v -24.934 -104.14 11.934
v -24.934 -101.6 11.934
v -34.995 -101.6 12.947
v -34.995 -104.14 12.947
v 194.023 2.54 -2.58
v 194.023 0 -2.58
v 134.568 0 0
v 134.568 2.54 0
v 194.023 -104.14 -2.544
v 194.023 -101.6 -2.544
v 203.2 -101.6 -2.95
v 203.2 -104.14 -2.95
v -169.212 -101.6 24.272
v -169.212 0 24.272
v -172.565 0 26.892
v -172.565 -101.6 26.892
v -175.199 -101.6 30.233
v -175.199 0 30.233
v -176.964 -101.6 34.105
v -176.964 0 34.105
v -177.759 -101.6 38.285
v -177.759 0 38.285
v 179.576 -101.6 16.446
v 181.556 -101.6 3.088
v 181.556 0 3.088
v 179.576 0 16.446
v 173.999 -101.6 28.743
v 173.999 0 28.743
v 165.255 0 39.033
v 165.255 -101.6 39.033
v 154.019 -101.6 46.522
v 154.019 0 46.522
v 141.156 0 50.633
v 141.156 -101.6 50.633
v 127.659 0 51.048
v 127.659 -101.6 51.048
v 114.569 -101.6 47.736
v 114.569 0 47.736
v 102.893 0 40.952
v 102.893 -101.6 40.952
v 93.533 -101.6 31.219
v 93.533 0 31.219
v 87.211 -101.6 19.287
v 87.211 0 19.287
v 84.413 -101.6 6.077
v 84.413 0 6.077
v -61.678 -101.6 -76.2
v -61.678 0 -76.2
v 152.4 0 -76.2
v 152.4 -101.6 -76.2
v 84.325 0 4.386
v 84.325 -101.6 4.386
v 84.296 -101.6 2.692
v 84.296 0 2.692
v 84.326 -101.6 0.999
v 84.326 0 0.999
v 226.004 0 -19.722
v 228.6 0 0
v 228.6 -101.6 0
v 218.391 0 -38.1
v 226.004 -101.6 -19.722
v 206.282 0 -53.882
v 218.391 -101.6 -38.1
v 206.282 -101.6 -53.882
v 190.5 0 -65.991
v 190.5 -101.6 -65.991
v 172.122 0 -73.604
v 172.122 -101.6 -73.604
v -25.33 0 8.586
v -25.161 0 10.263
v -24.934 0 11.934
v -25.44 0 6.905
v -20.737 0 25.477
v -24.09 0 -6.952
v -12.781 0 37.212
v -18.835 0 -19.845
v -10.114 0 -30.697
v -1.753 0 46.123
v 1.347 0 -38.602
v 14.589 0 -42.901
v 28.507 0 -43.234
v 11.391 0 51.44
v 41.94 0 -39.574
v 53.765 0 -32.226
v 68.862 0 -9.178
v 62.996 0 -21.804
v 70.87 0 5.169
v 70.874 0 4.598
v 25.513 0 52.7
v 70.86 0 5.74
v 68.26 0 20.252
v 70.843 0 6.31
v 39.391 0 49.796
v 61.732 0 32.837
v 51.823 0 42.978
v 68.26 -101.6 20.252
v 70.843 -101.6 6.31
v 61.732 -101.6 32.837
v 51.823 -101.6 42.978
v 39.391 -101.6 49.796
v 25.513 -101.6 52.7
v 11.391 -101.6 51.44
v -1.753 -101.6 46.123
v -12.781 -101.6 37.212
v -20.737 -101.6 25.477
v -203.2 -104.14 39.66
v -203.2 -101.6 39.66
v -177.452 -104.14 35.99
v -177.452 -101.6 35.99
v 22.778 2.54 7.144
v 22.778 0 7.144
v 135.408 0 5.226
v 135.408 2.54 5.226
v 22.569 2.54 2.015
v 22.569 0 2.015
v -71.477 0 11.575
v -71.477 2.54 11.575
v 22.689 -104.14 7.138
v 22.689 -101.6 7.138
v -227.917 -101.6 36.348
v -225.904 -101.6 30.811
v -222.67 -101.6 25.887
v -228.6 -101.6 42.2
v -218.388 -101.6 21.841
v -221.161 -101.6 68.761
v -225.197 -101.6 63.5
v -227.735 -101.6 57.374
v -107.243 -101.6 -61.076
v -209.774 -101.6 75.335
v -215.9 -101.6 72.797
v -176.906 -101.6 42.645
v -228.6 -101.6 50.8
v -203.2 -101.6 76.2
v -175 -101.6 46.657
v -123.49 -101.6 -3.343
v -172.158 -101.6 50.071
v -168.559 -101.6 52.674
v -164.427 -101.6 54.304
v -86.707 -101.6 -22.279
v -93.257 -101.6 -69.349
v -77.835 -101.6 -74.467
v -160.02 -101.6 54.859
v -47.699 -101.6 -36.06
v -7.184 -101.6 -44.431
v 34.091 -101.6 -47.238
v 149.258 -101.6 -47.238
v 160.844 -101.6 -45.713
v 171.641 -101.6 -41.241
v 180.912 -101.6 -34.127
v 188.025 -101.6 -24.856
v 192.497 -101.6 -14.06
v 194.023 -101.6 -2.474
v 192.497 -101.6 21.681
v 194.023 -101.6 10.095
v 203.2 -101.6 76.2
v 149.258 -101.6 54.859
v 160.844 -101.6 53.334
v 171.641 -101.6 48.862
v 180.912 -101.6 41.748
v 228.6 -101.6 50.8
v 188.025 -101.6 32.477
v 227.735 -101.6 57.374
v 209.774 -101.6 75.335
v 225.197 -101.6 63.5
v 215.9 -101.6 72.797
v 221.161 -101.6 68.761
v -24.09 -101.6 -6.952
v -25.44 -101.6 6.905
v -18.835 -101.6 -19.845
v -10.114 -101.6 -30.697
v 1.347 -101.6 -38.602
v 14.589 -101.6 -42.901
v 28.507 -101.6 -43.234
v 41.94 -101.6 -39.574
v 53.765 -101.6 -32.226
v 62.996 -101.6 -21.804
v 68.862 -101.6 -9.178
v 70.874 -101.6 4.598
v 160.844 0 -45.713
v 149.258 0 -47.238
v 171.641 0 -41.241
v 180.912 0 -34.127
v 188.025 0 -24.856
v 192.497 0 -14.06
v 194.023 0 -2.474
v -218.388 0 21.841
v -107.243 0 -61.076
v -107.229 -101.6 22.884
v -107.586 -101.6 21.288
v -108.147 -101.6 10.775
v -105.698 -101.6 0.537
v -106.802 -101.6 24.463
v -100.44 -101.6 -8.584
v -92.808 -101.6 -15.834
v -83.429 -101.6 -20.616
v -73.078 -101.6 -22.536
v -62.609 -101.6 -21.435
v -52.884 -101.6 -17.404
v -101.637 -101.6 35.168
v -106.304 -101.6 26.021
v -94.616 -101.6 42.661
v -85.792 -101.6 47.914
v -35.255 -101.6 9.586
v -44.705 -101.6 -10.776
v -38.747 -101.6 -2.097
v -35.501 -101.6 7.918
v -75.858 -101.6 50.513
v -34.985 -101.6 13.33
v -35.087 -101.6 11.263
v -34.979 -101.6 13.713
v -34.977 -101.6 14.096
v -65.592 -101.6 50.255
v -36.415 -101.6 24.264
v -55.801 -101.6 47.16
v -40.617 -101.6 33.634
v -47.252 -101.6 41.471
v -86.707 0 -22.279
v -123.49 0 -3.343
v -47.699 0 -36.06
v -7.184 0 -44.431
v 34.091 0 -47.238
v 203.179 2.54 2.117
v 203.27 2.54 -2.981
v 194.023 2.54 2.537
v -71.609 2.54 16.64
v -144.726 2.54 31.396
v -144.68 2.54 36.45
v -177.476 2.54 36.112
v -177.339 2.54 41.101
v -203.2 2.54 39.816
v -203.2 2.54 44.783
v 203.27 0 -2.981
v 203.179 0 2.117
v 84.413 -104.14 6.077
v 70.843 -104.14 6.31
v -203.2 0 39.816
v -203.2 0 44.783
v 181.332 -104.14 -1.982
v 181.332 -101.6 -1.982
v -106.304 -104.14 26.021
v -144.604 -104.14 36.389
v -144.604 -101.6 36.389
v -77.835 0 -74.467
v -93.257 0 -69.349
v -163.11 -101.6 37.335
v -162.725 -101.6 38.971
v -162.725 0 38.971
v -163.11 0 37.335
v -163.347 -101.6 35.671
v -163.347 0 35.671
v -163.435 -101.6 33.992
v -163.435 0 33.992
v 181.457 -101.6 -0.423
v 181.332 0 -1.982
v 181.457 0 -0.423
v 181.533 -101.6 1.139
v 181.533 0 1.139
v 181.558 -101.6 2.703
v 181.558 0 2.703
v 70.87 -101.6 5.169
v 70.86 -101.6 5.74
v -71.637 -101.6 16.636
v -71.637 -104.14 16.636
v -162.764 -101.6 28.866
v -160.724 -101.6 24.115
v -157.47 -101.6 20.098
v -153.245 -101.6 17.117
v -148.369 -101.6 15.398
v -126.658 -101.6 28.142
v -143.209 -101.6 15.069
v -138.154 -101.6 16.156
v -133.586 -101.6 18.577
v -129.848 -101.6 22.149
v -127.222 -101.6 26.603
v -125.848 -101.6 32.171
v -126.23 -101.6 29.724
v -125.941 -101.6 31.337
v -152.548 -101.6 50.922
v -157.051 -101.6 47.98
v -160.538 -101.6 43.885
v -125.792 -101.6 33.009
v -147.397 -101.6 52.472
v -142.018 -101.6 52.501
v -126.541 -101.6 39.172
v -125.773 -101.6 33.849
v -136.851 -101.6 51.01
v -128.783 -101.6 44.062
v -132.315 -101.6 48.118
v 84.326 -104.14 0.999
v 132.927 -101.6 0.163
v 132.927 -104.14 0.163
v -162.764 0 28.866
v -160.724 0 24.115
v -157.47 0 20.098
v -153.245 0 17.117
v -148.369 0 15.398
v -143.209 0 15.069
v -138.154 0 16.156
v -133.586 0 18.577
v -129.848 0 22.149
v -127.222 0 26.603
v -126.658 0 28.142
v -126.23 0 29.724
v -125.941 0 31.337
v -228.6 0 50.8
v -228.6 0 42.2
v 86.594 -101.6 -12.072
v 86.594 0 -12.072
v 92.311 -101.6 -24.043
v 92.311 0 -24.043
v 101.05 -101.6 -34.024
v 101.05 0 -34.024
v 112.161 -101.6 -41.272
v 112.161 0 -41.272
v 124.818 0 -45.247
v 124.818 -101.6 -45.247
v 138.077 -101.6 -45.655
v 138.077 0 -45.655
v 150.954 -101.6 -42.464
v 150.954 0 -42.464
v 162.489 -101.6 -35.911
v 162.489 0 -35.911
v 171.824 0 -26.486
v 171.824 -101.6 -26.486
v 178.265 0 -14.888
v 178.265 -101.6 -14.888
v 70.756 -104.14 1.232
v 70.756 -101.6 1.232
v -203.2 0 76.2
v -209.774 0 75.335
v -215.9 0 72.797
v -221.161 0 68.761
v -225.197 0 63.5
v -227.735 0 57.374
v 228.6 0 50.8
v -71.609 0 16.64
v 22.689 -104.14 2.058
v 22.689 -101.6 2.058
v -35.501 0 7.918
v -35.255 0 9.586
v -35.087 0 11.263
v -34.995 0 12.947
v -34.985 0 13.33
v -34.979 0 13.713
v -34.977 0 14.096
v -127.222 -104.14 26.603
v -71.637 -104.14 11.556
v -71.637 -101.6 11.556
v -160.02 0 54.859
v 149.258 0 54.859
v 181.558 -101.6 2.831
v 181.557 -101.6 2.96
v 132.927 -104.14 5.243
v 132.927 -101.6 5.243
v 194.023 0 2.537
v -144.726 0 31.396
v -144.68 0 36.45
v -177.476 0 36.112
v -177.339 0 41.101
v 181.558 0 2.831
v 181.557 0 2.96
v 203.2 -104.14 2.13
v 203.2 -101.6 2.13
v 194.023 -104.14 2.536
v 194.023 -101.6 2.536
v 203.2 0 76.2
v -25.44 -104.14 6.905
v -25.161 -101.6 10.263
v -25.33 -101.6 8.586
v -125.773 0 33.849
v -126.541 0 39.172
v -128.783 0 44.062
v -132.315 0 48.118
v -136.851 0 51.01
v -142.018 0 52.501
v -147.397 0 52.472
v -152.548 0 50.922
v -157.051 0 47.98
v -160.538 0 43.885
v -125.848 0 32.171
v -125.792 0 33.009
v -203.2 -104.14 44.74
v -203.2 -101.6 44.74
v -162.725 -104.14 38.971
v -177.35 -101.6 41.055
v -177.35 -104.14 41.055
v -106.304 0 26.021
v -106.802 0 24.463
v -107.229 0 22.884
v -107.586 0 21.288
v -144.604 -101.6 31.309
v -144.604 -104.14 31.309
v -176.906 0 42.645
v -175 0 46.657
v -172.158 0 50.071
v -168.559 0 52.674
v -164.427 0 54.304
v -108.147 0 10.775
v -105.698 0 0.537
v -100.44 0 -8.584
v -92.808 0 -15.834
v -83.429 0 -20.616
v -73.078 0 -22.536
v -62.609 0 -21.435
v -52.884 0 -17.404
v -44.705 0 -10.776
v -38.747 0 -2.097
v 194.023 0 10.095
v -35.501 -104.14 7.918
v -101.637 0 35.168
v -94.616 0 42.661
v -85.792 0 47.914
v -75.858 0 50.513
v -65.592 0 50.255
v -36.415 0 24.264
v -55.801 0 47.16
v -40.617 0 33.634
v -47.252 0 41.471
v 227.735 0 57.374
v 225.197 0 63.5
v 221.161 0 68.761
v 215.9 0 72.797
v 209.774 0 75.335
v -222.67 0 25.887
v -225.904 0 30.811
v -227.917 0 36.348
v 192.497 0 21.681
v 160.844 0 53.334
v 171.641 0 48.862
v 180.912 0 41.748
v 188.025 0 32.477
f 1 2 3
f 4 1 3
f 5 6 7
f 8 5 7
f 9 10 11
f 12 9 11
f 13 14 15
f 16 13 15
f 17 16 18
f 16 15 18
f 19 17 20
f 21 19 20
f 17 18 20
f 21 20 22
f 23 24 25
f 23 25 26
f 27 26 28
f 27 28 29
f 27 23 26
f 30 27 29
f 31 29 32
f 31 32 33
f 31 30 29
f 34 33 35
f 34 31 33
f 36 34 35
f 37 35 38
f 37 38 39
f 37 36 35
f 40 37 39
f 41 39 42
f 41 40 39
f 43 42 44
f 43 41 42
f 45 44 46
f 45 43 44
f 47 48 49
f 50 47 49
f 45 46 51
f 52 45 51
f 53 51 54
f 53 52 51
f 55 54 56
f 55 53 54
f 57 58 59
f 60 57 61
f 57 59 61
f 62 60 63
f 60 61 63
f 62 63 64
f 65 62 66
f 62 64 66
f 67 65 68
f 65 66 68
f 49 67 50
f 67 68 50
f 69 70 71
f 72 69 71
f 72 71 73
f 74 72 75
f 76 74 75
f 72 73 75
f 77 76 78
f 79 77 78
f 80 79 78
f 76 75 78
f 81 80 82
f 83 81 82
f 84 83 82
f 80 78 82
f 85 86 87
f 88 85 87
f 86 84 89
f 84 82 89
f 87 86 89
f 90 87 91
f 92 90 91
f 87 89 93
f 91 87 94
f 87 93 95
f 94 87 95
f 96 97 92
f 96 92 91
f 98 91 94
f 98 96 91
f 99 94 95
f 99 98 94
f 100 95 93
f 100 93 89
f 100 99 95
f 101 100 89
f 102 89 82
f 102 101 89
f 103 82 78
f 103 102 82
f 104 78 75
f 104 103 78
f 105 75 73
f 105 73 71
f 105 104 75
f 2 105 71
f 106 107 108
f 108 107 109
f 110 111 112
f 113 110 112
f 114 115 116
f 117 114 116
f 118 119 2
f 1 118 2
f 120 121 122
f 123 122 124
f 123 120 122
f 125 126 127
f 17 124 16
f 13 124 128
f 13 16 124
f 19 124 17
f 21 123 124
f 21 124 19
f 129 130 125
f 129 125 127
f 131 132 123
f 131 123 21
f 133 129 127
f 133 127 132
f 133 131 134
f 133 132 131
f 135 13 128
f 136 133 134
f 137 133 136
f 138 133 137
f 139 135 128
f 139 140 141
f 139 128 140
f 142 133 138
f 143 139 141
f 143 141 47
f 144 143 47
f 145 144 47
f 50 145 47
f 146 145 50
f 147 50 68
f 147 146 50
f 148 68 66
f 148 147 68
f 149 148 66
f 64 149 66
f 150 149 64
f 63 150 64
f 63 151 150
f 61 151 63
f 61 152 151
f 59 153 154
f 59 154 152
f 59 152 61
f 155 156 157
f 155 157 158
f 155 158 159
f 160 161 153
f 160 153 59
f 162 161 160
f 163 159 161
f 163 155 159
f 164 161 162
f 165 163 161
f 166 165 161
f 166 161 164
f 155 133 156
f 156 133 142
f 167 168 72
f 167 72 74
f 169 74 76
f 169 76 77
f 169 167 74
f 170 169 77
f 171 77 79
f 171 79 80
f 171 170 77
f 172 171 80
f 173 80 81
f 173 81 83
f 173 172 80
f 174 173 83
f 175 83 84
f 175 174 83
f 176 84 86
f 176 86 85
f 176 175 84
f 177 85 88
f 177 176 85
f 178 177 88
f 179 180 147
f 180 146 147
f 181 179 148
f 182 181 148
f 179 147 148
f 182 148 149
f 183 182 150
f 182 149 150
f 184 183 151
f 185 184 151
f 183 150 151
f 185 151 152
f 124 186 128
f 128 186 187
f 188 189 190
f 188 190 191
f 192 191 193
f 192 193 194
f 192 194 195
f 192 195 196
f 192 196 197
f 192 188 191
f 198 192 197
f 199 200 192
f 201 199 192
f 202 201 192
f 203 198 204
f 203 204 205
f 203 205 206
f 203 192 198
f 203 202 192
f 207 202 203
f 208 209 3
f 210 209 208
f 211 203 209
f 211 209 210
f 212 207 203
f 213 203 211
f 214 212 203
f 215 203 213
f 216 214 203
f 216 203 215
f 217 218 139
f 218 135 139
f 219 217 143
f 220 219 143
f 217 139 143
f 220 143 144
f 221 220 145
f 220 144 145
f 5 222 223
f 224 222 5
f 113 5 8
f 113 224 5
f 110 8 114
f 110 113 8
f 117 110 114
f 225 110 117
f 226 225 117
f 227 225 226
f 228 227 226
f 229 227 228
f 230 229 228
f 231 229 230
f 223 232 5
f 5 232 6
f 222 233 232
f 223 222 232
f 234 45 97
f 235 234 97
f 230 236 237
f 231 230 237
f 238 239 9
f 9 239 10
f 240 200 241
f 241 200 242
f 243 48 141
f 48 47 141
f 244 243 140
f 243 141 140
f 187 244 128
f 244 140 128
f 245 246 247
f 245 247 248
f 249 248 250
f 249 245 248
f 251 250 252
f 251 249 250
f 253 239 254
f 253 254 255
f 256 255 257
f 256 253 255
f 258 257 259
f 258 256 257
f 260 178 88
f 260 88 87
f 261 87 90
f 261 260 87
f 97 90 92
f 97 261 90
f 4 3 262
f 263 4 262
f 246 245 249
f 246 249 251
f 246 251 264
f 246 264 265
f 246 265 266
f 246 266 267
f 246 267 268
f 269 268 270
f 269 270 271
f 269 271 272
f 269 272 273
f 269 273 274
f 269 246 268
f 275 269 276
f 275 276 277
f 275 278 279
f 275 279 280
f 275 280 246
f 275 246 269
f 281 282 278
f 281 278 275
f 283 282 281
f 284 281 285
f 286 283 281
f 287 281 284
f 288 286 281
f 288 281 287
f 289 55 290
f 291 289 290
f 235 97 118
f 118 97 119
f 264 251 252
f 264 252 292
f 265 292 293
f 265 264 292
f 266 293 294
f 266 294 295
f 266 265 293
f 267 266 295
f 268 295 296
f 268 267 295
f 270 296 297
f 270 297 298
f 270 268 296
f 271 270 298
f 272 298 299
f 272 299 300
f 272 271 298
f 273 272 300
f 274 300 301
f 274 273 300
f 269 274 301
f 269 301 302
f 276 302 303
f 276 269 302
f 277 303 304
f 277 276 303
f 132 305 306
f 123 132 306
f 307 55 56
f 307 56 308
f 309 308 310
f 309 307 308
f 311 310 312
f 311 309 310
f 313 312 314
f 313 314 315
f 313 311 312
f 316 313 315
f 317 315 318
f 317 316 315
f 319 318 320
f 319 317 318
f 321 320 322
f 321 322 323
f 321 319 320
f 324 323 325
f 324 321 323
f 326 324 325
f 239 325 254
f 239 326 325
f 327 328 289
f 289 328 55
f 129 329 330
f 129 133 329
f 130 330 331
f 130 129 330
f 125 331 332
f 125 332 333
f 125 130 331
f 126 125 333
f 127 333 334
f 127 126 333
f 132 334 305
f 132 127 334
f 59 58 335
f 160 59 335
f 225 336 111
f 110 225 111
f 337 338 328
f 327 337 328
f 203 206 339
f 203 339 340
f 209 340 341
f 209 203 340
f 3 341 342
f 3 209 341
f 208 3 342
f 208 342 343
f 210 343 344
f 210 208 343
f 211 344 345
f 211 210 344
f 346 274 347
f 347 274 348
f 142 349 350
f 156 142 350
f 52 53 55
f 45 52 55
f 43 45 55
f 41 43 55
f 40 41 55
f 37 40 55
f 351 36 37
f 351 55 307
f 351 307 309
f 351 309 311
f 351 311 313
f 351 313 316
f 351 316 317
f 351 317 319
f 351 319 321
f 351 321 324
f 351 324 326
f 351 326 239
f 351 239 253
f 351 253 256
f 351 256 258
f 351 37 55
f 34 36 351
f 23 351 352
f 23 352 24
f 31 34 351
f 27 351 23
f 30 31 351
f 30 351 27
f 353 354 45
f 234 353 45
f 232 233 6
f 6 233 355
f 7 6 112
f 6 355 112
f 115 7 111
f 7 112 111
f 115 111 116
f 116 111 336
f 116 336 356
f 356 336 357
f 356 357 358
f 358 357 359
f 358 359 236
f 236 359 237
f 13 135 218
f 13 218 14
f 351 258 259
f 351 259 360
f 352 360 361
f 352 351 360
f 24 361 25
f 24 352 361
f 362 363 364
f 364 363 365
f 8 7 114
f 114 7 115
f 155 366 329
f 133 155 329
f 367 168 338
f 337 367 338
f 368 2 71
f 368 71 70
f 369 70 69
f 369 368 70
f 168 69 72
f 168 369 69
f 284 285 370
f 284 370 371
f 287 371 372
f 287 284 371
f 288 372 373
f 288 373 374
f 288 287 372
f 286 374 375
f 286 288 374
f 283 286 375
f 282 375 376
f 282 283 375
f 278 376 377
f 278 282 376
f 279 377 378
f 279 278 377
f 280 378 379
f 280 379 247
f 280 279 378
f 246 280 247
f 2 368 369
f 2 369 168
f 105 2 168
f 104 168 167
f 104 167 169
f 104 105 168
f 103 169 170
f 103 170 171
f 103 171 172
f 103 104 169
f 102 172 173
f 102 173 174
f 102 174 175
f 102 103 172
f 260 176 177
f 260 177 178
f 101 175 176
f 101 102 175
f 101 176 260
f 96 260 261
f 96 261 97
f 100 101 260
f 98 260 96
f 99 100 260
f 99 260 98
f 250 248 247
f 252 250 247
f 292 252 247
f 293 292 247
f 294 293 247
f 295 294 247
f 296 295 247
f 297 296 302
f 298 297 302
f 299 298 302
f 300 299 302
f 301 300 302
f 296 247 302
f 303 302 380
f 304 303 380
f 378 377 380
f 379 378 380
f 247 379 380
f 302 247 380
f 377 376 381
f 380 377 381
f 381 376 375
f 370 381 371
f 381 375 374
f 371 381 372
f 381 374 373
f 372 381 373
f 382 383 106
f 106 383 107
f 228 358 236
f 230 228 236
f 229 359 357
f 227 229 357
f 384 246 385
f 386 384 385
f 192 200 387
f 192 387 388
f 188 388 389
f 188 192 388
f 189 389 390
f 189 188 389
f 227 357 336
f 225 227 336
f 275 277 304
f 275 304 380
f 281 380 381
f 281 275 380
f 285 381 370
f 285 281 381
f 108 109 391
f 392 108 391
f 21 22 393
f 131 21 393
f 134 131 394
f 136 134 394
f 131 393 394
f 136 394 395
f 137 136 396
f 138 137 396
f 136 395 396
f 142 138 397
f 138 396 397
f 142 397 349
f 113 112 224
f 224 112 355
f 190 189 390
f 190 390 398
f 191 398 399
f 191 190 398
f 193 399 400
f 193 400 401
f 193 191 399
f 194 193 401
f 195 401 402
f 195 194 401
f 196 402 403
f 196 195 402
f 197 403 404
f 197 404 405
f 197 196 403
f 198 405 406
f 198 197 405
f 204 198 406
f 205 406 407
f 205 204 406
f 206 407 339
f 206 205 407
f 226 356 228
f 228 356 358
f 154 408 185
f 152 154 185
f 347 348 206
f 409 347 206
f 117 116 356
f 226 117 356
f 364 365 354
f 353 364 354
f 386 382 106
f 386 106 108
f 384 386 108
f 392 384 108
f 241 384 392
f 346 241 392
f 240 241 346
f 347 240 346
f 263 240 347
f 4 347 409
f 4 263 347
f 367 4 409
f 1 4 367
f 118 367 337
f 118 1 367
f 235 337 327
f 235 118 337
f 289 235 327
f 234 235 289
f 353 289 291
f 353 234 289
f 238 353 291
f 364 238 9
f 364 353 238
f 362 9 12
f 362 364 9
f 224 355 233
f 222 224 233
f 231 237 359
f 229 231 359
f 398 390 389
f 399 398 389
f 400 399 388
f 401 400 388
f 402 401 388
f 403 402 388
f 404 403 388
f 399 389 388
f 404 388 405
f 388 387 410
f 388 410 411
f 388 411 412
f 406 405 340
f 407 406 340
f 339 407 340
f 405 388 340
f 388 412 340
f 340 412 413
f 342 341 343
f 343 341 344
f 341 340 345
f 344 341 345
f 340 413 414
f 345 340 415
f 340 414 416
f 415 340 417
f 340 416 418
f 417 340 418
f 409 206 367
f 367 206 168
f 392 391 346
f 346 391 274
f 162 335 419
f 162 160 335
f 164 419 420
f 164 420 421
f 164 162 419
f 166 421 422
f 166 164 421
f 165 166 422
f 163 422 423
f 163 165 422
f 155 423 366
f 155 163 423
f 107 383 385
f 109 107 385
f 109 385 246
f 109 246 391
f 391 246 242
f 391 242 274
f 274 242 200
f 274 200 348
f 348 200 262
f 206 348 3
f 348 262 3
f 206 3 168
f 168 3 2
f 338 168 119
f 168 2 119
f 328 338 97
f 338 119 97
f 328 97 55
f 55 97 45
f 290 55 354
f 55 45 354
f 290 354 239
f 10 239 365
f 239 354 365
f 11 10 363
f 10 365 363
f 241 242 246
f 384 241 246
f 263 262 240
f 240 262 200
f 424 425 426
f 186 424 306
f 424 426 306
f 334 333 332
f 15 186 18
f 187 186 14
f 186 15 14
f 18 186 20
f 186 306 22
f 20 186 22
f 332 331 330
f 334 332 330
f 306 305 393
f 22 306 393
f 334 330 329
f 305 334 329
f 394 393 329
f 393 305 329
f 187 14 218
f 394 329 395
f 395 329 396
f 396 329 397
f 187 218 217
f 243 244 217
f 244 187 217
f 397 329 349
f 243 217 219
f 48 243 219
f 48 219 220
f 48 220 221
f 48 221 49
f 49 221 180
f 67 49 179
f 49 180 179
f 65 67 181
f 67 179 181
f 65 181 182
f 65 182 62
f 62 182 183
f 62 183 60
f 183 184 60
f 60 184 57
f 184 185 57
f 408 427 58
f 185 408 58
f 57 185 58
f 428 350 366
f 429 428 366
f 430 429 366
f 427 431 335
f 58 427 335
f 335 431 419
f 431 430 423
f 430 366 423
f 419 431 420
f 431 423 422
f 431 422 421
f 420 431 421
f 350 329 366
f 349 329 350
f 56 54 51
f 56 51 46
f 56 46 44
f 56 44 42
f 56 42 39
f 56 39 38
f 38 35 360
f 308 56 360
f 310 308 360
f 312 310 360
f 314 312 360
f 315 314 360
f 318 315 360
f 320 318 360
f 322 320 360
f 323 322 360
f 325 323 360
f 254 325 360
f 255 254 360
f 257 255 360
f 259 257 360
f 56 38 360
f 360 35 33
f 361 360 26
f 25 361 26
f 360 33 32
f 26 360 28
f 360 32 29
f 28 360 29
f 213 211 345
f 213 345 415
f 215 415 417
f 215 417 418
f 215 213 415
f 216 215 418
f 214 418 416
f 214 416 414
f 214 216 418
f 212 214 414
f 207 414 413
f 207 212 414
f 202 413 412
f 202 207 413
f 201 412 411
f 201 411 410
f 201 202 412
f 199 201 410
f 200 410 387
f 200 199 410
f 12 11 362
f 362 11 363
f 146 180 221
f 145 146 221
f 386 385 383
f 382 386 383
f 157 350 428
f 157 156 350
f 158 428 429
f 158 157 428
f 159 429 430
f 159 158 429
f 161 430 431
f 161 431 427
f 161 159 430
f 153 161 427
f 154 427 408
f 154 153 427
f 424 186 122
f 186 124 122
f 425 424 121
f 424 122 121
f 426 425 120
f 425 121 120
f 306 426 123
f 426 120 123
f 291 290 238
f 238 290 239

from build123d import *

# Parameters (mm, degrees)
F1_DEPTH    = 101.6
F2_R        = 25.4
F3_R        = 76.2
F4_R        = 25.4
F5_T1_DEPTH = 101.6
F6_R        = 44.7643478735
F7_R        = 304.8
F9_DEPTH    = 101.6
F10_DEPTH   = 2.54
F12_DEPTH   = 2.54


# Not quite as in the source:
# - a fillet or chamfer that OpenCascade refuses, or shapes differently, is made with other operations: its cross-section is extruded or revolved along the edge and cut away or added
# - a feature names something its author has since deleted; it is built from what else it names


with BuildPart() as f1:
    # F0 (on Front) → F1 (new body)
    with BuildSketch(Plane.XZ):
        Polygon((228.6, -76.2), (228.6, 76.2), (-228.6, 76.2), (-228.6, 29.4590149546), (-86.9704671455, -76.2), align=None)
        Polygon((-50.8129218496, -47.2383520842), (-177.8, 29.4590149546), (-177.8, 54.8590149546), (194.0227749825, 54.8590149546), (194.0227749825, -47.2383520842), align=None, mode=Mode.SUBTRACT)
    extrude(amount=F1_DEPTH)

    # F2
    f2_edges = [f1.edges().sort_by_distance(p)[0] for p in [
        (-228.6, -50.8, 76.2),
        (-228.6, -50.8, 29.459015),
    ]]
    fillet(f2_edges, radius=F2_R)

    # F3
    f3_edges = [f1.edges().sort_by_distance(p)[0] for p in [
        (-86.970467, -50.8, -76.2),
        (228.6, -50.8, -76.2),
    ]]
    fillet(f3_edges, radius=F3_R)

    # F4
    f4_edges = [f1.edges().sort_by_distance(p)[0] for p in [
        (228.6, -50.8, 76.2),
    ]]
    fillet(f4_edges, radius=F4_R)

    # F5: fillet of radius 17.78 on 2 edges, made by hand

    # F5_s2 → F5_t1 (join)
    with BuildSketch(Plane.XZ):
        with BuildLine():
            ThreePointArc((-169.2122093999, 24.2721806932), (-175.5049262693, 30.7540427919), (-177.8, 39.4916316146))
            Line((-177.8, 39.4916316146), (-177.8, 29.4590149546))
            Line((-177.8, 29.4590149546), (-169.2122093999, 24.2721806932))
        make_face()
        with BuildLine():
            ThreePointArc((-177.8, 37.0790149546), (-172.5923585695, 49.6513735241), (-160.02, 54.8590149546))
            Line((-160.02, 54.8590149546), (-177.8, 54.8590149546))
            Line((-177.8, 54.8590149546), (-177.8, 37.0790149546))
        make_face()
    extrude(amount=F5_T1_DEPTH)

    # F6
    f6_edges = [f1.edges().sort_by_distance(p)[0] for p in [
        (194.022775, -50.8, -47.238352),
        (194.022775, -50.8, 54.859015),
    ]]
    fillet(f6_edges, radius=F6_R)

    # F7
    f7_edges = [f1.edges().sort_by_distance(p)[0] for p in [
        (-50.812922, -50.8, -47.238352),
    ]]
    fillet(f7_edges, radius=F7_R)


with BuildPart() as f9:
    # F8 (on face) → F9 (new body)
    with BuildSketch(Plane.XZ.offset(101.6)):
        with BuildLine():
            ThreePointArc((181.5579526246, 2.7030038423), (181.5575706981, 2.8957391669), (181.5564249247, 3.0884714642))
            Line((181.5564249247, 3.0884714642), (132.9267988621, 5.2430038423))
            Line((132.9267988621, 5.2430038423), (84.4128365038, 6.0771070674))
            ThreePointArc((84.4128365038, 6.0771070674), (84.3028312187, 3.5389983943), (84.3255215946, 0.9986082775))
            Line((84.3255215946, 0.9986082775), (132.9267988621, 0.1630038423))
            Line((132.9267988621, 0.1630038423), (181.3317967881, -1.981576401))
            ThreePointArc((181.3317967881, -1.981576401), (181.5013807609, 0.3579857976), (181.5579526246, 2.7030038423))
        make_face()
        with BuildLine():
            Line((132.9267988621, 5.2430038423), (181.5564249247, 3.0884714642))
            ThreePointArc((181.5564249247, 3.0884714642), (134.4222353253, 51.3111593931), (84.4128365038, 6.0771070674))
            Line((84.4128365038, 6.0771070674), (132.9267988621, 5.2430038423))
        make_face()
        with BuildLine():
            Line((132.9267988621, 0.1630038423), (84.3255215946, 0.9986082775))
            ThreePointArc((84.3255215946, 0.9986082775), (131.4334782085, -45.9052167557), (181.3317967881, -1.981576401))
            Line((181.3317967881, -1.981576401), (132.9267988621, 0.1630038423))
        make_face()
    extrude(amount=-F9_DEPTH)


with BuildPart() as f9b:
    # F8 (on face) → F9, piece 2 (new body)
    with BuildSketch(Plane.XZ.offset(101.6)):
        with BuildLine():
            ThreePointArc((-24.933795283, 11.9335457727), (-25.2529707533, 9.4256839495), (-25.4401728054, 6.904533558))
            Line((-25.4401728054, 6.904533558), (22.6892231991, 2.0583245484))
            Line((22.6892231991, 2.0583245484), (70.7560995281, 1.231908098))
            ThreePointArc((70.7560995281, 1.231908098), (70.8443963799, 2.9140871326), (70.8738406589, 4.5983245484))
            ThreePointArc((70.8738406589, 4.5983245484), (70.866233503, 5.4545008872), (70.8434144374, 6.3104068879))
            Line((70.8434144374, 6.3104068879), (22.6892231991, 7.1383245484))
            Line((22.6892231991, 7.1383245484), (-24.933795283, 11.9335457727))
        make_face()
        with BuildLine():
            ThreePointArc((70.8434144374, 6.3104068879), (25.5133086889, 52.7001114268), (-24.933795283, 11.9335457727))
            Line((-24.933795283, 11.9335457727), (22.6892231991, 7.1383245484))
            Line((22.6892231991, 7.1383245484), (70.8434144374, 6.3104068879))
        make_face()
        with BuildLine():
            Line((22.6892231991, 2.0583245484), (-25.4401728054, 6.904533558))
            ThreePointArc((-25.4401728054, 6.904533558), (19.8527382123, -43.5027327442), (70.7560995281, 1.231908098))
            Line((70.7560995281, 1.231908098), (22.6892231991, 2.0583245484))
        make_face()
    extrude(amount=-F9_DEPTH)


with BuildPart() as f9c:
    # F8 (on face) → F9, piece 3 (new body)
    with BuildSketch(Plane.XZ.offset(101.6)):
        with BuildLine():
            Line((-71.6374335136, 16.6361934509), (-106.3043915588, 26.0207271152))
            ThreePointArc((-106.3043915588, 26.0207271152), (-107.0242596832, 23.6755993229), (-107.5856804463, 21.2875789701))
            Line((-107.5856804463, 21.2875789701), (-71.6374335136, 11.5561934509))
            Line((-71.6374335136, 11.5561934509), (-35.5013362705, 7.9176046763))
            ThreePointArc((-35.5013362705, 7.9176046763), (-35.1613745589, 10.4233735068), (-34.994958748, 12.9466168909))
            Line((-34.994958748, 12.9466168909), (-71.6374335136, 16.6361934509))
        make_face()
        with BuildLine():
            ThreePointArc((-34.9769304727, 14.0961934509), (-65.5924205947, 50.2548757005), (-106.3043915588, 26.0207271152))
            Line((-106.3043915588, 26.0207271152), (-71.6374335136, 16.6361934509))
            Line((-71.6374335136, 16.6361934509), (-34.994958748, 12.9466168909))
            ThreePointArc((-34.994958748, 12.9466168909), (-34.9814378186, 13.521334493), (-34.9769304727, 14.0961934509))
        make_face()
        with BuildLine():
            Line((-71.6374335136, 11.5561934509), (-107.5856804463, 21.2875789701))
            ThreePointArc((-107.5856804463, 21.2875789701), (-78.3230804598, -21.9495359512), (-35.5013362705, 7.9176046763))
            Line((-35.5013362705, 7.9176046763), (-71.6374335136, 11.5561934509))
        make_face()
    extrude(amount=-F9_DEPTH)


with BuildPart() as f9d:
    # F8 (on face) → F9, piece 4 (new body)
    with BuildSketch(Plane.XZ.offset(101.6)):
        with BuildLine():
            Line((-144.6040853896, 36.3886620699), (-162.7251657845, 38.9712052824))
            ThreePointArc((-162.7251657845, 38.9712052824), (-163.2469093716, 36.5055620718), (-163.4347349564, 33.9923302158))
            Line((-163.4347349564, 33.9923302158), (-144.6040853896, 31.3086620699))
            Line((-144.6040853896, 31.3086620699), (-127.2224929369, 26.6033706712))
            ThreePointArc((-127.2224929369, 26.6033706712), (-126.4271303203, 28.9280616948), (-125.9412040494, 31.3365188163))
            Line((-125.9412040494, 31.3365188163), (-144.6040853896, 36.3886620699))
        make_face()
        with BuildLine():
            ThreePointArc((-125.9412040494, 31.3365188163), (-125.8150139618, 32.5897742577), (-125.7728877738, 33.8486620699))
            ThreePointArc((-125.7728877738, 33.8486620699), (-142.0183207333, 52.501485577), (-162.7251657845, 38.9712052824))
            Line((-162.7251657845, 38.9712052824), (-144.6040853896, 36.3886620699))
            Line((-144.6040853896, 36.3886620699), (-125.9412040494, 31.3365188163))
        make_face()
        with BuildLine():
            Line((-144.6040853896, 31.3086620699), (-163.4347349564, 33.9923302158))
            ThreePointArc((-163.4347349564, 33.9923302158), (-148.3689389615, 15.3976490564), (-127.2224929369, 26.6033706712))
            Line((-127.2224929369, 26.6033706712), (-144.6040853896, 31.3086620699))
        make_face()
    extrude(amount=-F9_DEPTH)


with BuildPart() as f10:
    # F8 (on face) → F10 (new body)
    with BuildSketch(Plane.XZ.offset(101.6)):
        with BuildLine():
            ThreePointArc((-24.933795283, 11.9335457727), (-25.2529707533, 9.4256839495), (-25.4401728054, 6.904533558))
            Line((-25.4401728054, 6.904533558), (22.6892231991, 2.0583245484))
            Line((22.6892231991, 2.0583245484), (70.7560995281, 1.231908098))
            ThreePointArc((70.7560995281, 1.231908098), (70.8443963799, 2.9140871326), (70.8738406589, 4.5983245484))
            ThreePointArc((70.8738406589, 4.5983245484), (70.866233503, 5.4545008872), (70.8434144374, 6.3104068879))
            Line((70.8434144374, 6.3104068879), (22.6892231991, 7.1383245484))
            Line((22.6892231991, 7.1383245484), (-24.933795283, 11.9335457727))
        make_face()
        with BuildLine():
            ThreePointArc((-34.994958748, 12.9466168909), (-35.1613745589, 10.4233735068), (-35.5013362705, 7.9176046763))
            Line((-35.5013362705, 7.9176046763), (-25.4401728054, 6.904533558))
            ThreePointArc((-25.4401728054, 6.904533558), (-25.2529707533, 9.4256839495), (-24.933795283, 11.9335457727))
            Line((-24.933795283, 11.9335457727), (-34.994958748, 12.9466168909))
        make_face()
        with BuildLine():
            Line((-71.6374335136, 16.6361934509), (-106.3043915588, 26.0207271152))
            ThreePointArc((-106.3043915588, 26.0207271152), (-107.0242596832, 23.6755993229), (-107.5856804463, 21.2875789701))
            Line((-107.5856804463, 21.2875789701), (-71.6374335136, 11.5561934509))
            Line((-71.6374335136, 11.5561934509), (-35.5013362705, 7.9176046763))
            ThreePointArc((-35.5013362705, 7.9176046763), (-35.1613745589, 10.4233735068), (-34.994958748, 12.9466168909))
            Line((-34.994958748, 12.9466168909), (-71.6374335136, 16.6361934509))
        make_face()
        with BuildLine():
            ThreePointArc((70.8738406589, 4.5983245484), (70.8443963799, 2.9140871326), (70.7560995281, 1.231908098))
            Line((70.7560995281, 1.231908098), (84.3255215946, 0.9986082775))
            ThreePointArc((84.3255215946, 0.9986082775), (84.3028312187, 3.5389983943), (84.4128365038, 6.0771070674))
            Line((84.4128365038, 6.0771070674), (70.8434144374, 6.3104068879))
            ThreePointArc((70.8434144374, 6.3104068879), (70.866233503, 5.4545008872), (70.8738406589, 4.5983245484))
        make_face()
        with BuildLine():
            ThreePointArc((181.5579526246, 2.7030038423), (181.5575706981, 2.8957391669), (181.5564249247, 3.0884714642))
            Line((181.5564249247, 3.0884714642), (132.9267988621, 5.2430038423))
            Line((132.9267988621, 5.2430038423), (84.4128365038, 6.0771070674))
            ThreePointArc((84.4128365038, 6.0771070674), (84.3028312187, 3.5389983943), (84.3255215946, 0.9986082775))
            Line((84.3255215946, 0.9986082775), (132.9267988621, 0.1630038423))
            Line((132.9267988621, 0.1630038423), (181.3317967881, -1.981576401))
            ThreePointArc((181.3317967881, -1.981576401), (181.5013807609, 0.3579857976), (181.5579526246, 2.7030038423))
        make_face()
        with BuildLine():
            Line((194.0227749825, -2.4740042106), (194.0227749825, 2.5361506464))
            Line((194.0227749825, 2.5361506464), (181.5564249247, 3.0884714642))
            ThreePointArc((181.5564249247, 3.0884714642), (181.5575706981, 2.8957391669), (181.5579526246, 2.7030038423))
            ThreePointArc((181.5579526246, 2.7030038423), (181.5013807609, 0.3579857976), (181.3317967881, -1.981576401))
            Line((181.3317967881, -1.981576401), (194.022720497, -2.5438469397))
            ThreePointArc((194.022720497, -2.5438469397), (194.0227613611, -2.5089255858), (194.0227749825, -2.4740042106))
        make_face()
        with BuildLine():
            Line((-144.6040853896, 36.3886620699), (-162.7251657845, 38.9712052824))
            ThreePointArc((-162.7251657845, 38.9712052824), (-163.2469093716, 36.5055620718), (-163.4347349564, 33.9923302158))
            Line((-163.4347349564, 33.9923302158), (-144.6040853896, 31.3086620699))
            Line((-144.6040853896, 31.3086620699), (-127.2224929369, 26.6033706712))
            ThreePointArc((-127.2224929369, 26.6033706712), (-126.4271303203, 28.9280616948), (-125.9412040494, 31.3365188163))
            Line((-125.9412040494, 31.3365188163), (-144.6040853896, 36.3886620699))
        make_face()
        with BuildLine():
            Line((-106.3043915588, 26.0207271152), (-125.9412040494, 31.3365188163))
            ThreePointArc((-125.9412040494, 31.3365188163), (-126.4271303203, 28.9280616948), (-127.2224929369, 26.6033706712))
            Line((-127.2224929369, 26.6033706712), (-107.5856804463, 21.2875789701))
            ThreePointArc((-107.5856804463, 21.2875789701), (-107.0242596832, 23.6755993229), (-106.3043915588, 26.0207271152))
        make_face()
        with BuildLine():
            ThreePointArc((-163.4347349564, 33.9923302158), (-163.2469093716, 36.5055620718), (-162.7251657845, 38.9712052824))
            Line((-162.7251657845, 38.9712052824), (-177.3496436399, 41.0554268187))
            ThreePointArc((-177.3496436399, 41.0554268187), (-177.6089554365, 39.678446941), (-177.7590309829, 38.2853232846))
            ThreePointArc((-177.7590309829, 38.2853232846), (-177.642814272, 37.1326451513), (-177.4517771113, 35.9899824687))
            Line((-177.4517771113, 35.9899824687), (-163.4347349564, 33.9923302158))
        make_face()
        with BuildLine():
            ThreePointArc((-177.7590309829, 38.2853232846), (-177.6089554365, 39.678446941), (-177.3496436399, 41.0554268187))
            Line((-177.3496436399, 41.0554268187), (-203.2, 44.7395152341))
            Line((-203.2, 44.7395152341), (-203.2, 42.1995152341))
            Line((-203.2, 42.1995152341), (-203.2, 39.6595152341))
            Line((-203.2, 39.6595152341), (-177.4517771113, 35.9899824687))
            ThreePointArc((-177.4517771113, 35.9899824687), (-177.642814272, 37.1326451513), (-177.7590309829, 38.2853232846))
        make_face()
        with BuildLine():
            Line((203.2, 2.1295542967), (194.0227749825, 2.5361506464))
            Line((194.0227749825, 2.5361506464), (194.0227749825, -2.4740042106))
            ThreePointArc((194.0227749825, -2.4740042106), (194.0227613611, -2.5089255858), (194.022720497, -2.5438469397))
            Line((194.022720497, -2.5438469397), (203.2, -2.9504457033))
            Line((203.2, -2.9504457033), (203.2, -0.4104457033))
            Line((203.2, -0.4104457033), (203.2, 2.1295542967))
        make_face()
    extrude(amount=F10_DEPTH)


with BuildPart() as f12:
    # F11 (on face) → F12 (new body)
    with BuildSketch(Plane(origin=(0, 0, 0), x_dir=(-1, 0, 0), z_dir=(0, 1, 0))):
        with BuildLine():
            Line((-135.4079395533, 5.2261864766), (-194.0227749825, 2.5366485965))
            Line((-194.0227749825, 2.5366485965), (-194.0227749825, -2.4740042106))
            ThreePointArc((-194.0227749825, -2.4740042106), (-194.0227435045, -2.5270907724), (-194.0226490705, -2.5801772595))
            Line((-194.0226490705, -2.5801772595), (-134.5681399107, 0))
            Line((-134.5681399107, 0), (-22.5686617196, 2.0149990451))
            Line((-22.5686617196, 2.0149990451), (71.4773535728, 11.5748010576))
            Line((71.4773535728, 11.5748010576), (144.7256356478, 31.3955061138))
            Line((144.7256356478, 31.3955061138), (177.4757826865, 36.1116832716))
            ThreePointArc((177.4757826865, 36.1116832716), (177.6509360226, 37.1941340701), (177.7590309829, 38.2853232846))
            ThreePointArc((177.7590309829, 38.2853232846), (177.6055562192, 39.7013445412), (177.3392307825, 41.1005376887))
            Line((177.3392307825, 41.1005376887), (144.6800976992, 36.4504270256))
            Line((144.6800976992, 36.4504270256), (71.608915925, 16.6399870068))
            Line((71.608915925, 16.6399870068), (-22.7780099958, 7.1439980529))
            Line((-22.7780099958, 7.1439980529), (-135.4079395533, 5.2261864766))
        make_face()
        with BuildLine():
            Line((203.2, 44.7826758027), (177.3392307825, 41.1005376887))
            ThreePointArc((177.3392307825, 41.1005376887), (177.6055562192, 39.7013445412), (177.7590309829, 38.2853232846))
            ThreePointArc((177.7590309829, 38.2853232846), (177.6509360226, 37.1941340701), (177.4757826865, 36.1116832716))
            Line((177.4757826865, 36.1116832716), (203.199505806, 39.8160219193))
            Line((203.199505806, 39.8160219193), (203.2, 44.7826758027))
        make_face()
        with BuildLine():
            Line((-194.0227749825, 2.5366485965), (-203.1785696745, 2.1165355574))
            Line((-203.1785696745, 2.1165355574), (-203.2696157694, -2.9814725276))
            Line((-203.2696157694, -2.9814725276), (-194.0226490705, -2.5801772595))
            ThreePointArc((-194.0226490705, -2.5801772595), (-194.0227435045, -2.5270907724), (-194.0227749825, -2.4740042106))
            Line((-194.0227749825, -2.4740042106), (-194.0227749825, 2.5366485965))
        make_face()
    extrude(amount=F12_DEPTH)


solid = Compound([f1.part, f9.part, f9b.part, f9c.part, f9d.part, f10.part, f12.part])
